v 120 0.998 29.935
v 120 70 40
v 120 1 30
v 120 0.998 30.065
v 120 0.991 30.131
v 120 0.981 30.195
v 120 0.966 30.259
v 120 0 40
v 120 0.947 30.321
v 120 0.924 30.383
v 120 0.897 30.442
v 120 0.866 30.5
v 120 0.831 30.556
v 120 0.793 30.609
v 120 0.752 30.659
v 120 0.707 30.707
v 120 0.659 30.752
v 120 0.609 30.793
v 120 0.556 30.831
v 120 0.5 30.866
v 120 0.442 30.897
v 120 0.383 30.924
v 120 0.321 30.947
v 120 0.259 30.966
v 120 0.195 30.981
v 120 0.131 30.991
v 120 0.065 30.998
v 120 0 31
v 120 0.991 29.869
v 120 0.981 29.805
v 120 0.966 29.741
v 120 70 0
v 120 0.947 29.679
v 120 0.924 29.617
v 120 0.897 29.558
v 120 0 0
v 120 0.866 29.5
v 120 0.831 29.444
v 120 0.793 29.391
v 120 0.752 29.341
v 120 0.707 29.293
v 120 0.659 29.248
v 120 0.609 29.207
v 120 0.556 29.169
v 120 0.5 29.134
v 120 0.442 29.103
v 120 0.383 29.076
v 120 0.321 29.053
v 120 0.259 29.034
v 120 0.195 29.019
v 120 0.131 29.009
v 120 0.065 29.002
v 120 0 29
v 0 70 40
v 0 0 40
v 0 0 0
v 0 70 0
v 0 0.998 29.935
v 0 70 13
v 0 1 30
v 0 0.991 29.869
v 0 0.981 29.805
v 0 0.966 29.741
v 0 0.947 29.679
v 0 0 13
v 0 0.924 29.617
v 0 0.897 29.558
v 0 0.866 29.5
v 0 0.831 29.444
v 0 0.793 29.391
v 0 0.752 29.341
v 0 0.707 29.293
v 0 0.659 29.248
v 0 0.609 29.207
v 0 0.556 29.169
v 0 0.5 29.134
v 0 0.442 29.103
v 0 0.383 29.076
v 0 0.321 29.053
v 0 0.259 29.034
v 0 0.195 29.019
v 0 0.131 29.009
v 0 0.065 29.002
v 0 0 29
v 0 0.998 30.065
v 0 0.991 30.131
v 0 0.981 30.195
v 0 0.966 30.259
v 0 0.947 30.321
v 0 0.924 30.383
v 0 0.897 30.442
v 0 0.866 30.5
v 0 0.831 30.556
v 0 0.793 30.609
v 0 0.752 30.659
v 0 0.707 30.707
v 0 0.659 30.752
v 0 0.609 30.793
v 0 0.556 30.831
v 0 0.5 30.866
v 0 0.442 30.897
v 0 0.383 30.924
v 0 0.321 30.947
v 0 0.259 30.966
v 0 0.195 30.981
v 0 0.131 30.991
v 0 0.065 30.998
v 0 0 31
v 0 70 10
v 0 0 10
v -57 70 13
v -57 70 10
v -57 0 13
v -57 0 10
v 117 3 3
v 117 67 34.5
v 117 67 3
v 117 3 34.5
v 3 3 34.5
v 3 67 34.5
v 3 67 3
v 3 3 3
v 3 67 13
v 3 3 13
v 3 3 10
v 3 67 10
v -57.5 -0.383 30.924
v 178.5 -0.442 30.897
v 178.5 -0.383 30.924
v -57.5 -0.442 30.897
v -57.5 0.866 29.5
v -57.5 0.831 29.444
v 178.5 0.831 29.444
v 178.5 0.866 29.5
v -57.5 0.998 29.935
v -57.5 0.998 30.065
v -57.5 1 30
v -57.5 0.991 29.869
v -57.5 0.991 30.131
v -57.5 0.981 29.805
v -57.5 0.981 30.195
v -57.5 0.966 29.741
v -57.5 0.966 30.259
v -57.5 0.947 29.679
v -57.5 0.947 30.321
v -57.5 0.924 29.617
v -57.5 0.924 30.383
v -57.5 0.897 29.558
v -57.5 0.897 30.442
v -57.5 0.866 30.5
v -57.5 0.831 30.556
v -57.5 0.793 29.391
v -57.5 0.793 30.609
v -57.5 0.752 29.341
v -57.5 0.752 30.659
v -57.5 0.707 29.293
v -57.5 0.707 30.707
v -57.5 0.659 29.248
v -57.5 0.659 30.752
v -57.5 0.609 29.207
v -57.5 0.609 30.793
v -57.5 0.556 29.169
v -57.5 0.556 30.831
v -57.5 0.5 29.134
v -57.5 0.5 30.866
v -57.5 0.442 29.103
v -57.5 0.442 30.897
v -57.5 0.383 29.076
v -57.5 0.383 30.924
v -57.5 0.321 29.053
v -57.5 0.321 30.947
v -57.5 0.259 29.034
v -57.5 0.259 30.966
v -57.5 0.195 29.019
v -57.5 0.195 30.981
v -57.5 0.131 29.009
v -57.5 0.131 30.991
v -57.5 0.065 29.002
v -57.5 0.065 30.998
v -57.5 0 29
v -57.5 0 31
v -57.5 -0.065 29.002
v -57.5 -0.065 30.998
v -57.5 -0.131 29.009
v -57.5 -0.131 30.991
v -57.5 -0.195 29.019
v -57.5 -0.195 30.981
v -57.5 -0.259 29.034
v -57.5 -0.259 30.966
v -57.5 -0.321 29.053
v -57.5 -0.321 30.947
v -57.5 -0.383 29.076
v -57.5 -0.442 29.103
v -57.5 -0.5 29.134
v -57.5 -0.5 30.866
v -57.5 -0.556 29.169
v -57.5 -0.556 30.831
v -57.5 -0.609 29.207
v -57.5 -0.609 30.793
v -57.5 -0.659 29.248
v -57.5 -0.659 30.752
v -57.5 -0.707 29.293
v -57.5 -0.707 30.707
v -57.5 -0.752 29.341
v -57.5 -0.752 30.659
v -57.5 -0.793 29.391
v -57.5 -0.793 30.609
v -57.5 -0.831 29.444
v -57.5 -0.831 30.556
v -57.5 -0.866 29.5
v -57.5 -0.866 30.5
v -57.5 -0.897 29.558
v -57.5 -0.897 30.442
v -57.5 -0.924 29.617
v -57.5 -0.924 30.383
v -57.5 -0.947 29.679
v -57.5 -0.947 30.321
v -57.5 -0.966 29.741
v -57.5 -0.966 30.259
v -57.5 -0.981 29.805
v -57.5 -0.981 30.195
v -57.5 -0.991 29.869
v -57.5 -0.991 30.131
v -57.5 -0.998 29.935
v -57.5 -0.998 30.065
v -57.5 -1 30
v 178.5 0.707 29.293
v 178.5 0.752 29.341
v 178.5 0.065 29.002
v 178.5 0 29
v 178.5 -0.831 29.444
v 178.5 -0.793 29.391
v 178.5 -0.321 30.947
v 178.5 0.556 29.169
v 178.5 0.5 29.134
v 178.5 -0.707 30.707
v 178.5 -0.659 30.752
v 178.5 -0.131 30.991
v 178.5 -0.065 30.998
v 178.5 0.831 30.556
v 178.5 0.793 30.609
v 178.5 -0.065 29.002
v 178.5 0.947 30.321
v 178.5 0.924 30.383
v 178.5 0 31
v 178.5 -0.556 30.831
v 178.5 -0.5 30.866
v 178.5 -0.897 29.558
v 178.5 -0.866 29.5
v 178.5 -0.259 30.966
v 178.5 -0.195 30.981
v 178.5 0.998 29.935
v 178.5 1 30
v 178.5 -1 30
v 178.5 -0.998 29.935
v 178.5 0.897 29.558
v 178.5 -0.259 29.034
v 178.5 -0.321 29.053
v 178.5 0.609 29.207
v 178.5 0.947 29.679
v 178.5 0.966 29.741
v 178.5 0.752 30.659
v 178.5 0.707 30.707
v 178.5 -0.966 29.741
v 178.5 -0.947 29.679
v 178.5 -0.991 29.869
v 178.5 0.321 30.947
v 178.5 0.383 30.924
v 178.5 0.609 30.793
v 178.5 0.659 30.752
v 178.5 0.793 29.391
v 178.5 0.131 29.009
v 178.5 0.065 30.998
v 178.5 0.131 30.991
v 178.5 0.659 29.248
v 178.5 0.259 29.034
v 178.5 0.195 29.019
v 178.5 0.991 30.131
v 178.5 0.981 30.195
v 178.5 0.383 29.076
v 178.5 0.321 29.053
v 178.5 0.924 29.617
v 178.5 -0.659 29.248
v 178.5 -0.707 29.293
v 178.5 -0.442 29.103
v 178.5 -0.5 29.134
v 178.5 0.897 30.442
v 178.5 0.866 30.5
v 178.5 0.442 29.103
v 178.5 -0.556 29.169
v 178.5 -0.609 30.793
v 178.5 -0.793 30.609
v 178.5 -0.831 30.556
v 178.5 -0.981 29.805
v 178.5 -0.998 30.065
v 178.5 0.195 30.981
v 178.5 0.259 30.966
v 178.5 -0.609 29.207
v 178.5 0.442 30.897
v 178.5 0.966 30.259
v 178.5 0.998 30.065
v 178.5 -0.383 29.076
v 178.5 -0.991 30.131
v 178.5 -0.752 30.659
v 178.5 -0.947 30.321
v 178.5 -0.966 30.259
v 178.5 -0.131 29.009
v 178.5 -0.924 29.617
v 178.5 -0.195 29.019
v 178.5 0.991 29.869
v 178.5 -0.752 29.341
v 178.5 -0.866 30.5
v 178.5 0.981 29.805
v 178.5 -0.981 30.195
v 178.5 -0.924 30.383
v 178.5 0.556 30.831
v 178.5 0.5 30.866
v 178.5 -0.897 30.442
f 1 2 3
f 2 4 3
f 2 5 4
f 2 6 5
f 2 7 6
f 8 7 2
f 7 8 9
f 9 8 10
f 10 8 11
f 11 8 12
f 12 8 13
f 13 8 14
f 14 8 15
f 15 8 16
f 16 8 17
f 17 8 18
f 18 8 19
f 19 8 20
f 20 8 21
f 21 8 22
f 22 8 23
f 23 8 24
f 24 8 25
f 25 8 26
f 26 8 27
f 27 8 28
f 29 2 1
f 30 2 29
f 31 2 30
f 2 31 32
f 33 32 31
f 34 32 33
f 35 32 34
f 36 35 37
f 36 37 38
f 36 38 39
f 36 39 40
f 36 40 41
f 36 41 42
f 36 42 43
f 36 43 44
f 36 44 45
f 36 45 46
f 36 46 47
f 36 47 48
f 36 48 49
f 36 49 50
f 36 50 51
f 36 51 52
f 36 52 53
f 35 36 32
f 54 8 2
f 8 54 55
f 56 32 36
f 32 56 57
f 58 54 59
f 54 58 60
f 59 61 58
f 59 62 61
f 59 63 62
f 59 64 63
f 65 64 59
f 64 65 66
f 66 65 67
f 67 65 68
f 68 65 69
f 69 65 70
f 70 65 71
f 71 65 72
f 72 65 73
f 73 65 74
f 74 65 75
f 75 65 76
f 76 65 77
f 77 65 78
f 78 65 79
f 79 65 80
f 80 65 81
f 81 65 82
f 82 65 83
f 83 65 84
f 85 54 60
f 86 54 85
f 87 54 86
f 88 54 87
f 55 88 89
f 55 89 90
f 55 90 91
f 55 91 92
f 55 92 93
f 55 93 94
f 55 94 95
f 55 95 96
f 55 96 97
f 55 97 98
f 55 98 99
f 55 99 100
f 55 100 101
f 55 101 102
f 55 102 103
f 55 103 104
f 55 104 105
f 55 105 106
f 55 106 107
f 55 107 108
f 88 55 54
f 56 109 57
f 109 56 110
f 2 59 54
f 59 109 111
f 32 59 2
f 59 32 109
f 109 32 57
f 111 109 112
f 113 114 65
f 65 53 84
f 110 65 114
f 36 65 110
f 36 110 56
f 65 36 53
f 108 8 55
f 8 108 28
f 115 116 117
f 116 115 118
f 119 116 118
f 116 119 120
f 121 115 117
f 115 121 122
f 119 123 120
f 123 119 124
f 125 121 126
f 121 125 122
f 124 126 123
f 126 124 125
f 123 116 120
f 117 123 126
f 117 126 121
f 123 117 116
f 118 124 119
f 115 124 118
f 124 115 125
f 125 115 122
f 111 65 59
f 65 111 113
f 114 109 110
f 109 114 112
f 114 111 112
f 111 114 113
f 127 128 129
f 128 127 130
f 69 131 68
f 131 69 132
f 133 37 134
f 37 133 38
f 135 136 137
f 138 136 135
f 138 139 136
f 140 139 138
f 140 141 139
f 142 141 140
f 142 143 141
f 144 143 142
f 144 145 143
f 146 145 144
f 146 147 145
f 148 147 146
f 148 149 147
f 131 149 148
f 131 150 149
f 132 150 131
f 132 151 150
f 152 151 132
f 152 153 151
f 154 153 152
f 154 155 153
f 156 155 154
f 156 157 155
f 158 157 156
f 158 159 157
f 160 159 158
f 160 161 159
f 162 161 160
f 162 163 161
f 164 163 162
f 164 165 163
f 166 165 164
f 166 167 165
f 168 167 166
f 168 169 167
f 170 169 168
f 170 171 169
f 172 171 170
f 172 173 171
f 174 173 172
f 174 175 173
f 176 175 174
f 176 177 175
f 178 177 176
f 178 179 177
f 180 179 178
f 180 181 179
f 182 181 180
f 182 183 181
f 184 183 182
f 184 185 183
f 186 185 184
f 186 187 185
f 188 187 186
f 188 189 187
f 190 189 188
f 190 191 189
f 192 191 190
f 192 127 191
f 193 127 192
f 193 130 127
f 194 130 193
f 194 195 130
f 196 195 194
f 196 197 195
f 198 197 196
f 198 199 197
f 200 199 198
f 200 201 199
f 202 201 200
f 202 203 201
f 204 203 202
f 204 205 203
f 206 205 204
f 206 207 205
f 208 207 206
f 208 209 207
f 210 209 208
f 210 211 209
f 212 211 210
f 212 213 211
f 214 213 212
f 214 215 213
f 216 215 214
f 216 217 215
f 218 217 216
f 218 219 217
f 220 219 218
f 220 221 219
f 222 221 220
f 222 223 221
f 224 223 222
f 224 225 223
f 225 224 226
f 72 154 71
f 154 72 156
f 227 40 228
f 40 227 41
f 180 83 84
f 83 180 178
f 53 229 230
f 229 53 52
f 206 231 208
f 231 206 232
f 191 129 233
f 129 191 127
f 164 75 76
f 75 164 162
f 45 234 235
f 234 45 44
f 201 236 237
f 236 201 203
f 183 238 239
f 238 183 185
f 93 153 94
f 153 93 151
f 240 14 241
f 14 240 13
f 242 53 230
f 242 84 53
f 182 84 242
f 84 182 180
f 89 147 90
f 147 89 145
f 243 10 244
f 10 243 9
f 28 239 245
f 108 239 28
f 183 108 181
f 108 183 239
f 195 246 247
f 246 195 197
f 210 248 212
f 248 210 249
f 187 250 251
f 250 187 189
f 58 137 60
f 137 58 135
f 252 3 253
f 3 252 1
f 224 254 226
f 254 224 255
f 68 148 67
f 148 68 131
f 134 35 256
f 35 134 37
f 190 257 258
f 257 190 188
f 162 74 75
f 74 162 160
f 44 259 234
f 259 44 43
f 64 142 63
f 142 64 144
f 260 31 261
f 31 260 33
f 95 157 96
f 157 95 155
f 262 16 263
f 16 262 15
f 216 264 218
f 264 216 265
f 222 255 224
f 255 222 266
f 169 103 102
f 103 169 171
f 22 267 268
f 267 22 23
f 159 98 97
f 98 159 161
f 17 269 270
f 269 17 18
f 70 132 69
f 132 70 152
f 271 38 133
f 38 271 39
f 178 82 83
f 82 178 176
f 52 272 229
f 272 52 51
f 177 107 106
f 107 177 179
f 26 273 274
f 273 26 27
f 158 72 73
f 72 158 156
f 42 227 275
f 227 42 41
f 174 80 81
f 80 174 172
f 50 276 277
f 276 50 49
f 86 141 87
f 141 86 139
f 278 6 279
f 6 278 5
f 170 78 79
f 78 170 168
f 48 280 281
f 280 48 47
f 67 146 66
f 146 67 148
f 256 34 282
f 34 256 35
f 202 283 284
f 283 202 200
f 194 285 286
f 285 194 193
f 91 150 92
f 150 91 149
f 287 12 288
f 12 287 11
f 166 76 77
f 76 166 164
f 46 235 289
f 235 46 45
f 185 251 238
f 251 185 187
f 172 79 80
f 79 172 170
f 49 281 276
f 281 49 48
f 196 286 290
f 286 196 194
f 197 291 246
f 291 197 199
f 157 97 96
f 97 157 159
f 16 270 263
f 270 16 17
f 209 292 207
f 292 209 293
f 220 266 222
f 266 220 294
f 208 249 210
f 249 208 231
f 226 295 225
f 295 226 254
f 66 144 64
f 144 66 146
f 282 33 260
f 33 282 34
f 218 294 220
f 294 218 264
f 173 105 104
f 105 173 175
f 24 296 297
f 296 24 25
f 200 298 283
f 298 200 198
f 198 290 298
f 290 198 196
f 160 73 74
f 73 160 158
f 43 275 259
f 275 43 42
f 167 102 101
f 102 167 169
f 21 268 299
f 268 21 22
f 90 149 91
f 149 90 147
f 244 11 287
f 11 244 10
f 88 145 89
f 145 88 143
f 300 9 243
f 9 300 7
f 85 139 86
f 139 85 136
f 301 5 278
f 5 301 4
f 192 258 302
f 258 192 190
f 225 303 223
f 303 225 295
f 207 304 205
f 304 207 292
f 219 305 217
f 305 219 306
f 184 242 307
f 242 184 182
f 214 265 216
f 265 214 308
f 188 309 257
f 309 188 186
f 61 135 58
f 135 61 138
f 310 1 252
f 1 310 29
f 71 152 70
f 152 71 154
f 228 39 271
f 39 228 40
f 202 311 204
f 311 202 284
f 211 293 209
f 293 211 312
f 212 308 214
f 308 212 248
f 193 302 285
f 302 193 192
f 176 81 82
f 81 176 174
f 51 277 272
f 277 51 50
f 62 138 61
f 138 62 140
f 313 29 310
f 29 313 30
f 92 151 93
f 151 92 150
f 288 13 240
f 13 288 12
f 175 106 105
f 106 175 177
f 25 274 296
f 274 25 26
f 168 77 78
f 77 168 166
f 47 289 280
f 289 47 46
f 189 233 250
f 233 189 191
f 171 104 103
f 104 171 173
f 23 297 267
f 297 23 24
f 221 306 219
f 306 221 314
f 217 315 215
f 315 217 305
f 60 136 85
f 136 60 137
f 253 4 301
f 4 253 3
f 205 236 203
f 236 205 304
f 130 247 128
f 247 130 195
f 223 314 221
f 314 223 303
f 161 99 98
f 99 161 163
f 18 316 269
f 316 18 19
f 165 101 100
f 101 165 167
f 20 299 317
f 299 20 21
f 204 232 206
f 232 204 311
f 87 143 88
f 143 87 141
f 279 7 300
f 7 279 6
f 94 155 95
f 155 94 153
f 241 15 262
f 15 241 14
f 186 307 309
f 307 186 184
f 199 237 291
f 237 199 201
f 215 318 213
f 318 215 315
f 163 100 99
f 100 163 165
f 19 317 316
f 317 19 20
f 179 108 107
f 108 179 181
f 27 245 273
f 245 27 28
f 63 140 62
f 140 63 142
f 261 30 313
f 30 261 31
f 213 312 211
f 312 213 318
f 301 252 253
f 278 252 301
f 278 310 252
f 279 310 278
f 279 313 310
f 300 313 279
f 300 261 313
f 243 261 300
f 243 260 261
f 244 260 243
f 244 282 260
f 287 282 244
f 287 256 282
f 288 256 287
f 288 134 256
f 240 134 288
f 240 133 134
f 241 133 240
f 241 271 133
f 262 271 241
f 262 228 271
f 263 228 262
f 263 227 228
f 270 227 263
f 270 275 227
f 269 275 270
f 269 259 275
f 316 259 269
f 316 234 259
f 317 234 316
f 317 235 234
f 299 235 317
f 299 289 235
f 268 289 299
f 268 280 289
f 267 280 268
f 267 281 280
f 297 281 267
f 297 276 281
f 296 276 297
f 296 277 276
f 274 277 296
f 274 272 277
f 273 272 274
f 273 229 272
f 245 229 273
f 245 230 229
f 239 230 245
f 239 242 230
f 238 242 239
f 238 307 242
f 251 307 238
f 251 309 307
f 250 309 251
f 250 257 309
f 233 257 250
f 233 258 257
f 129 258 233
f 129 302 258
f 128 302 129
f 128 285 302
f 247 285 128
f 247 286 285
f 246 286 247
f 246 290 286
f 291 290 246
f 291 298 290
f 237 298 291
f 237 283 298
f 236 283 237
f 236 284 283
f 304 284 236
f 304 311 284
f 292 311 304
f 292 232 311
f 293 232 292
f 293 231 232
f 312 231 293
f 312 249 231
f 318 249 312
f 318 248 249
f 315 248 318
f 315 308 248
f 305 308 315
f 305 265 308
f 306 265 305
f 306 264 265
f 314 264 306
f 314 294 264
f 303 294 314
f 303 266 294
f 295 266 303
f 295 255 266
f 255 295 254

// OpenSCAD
// Mini horizontal gel-electrophoresis box - buffer tank
// Print orientation: tank resting on XY plane, open top facing up (+Z)

// ---------------- Parameters ----------------
outer_x      = 120;   // outer length in X (mm)
outer_y      = 70;    // outer width in Y (mm)
outer_z      = 40;    // outer height in Z (mm)

wall         = 3;     // wall thickness (mm)

floor        = 3;     // floor thickness under the tank (mm)

platform_x   = 60;    // platform length along X (mm), centred
platform_y   = outer_y; // platform spans full inner width (mm)

platform_top_z = 13;  // height of platform top above outer floor (mm)

hole_d       = 2;     // electrode hole diameter (mm)

hole_y       = 0;     // electrode hole Y position (mm)

hole_z       = 30;    // electrode hole Z position (mm)

eps          = 0.5;   // cutter overshoot past faces (mm)

$fn = 96;             // curve resolution

// ---------------- Derived ----------------
inner_x = outer_x - 2 * wall;   // 114 mm
inner_y = outer_y - 2 * wall;   // 64 mm
inner_z = outer_z - floor - 2 * wall; // 34 mm (space between floor and open top)

platform_bot_z = platform_top_z - wall; // 10 mm (matches user statement: top at z = 13, wall 3)

// ---------------- Model ----------------
union() {
    // Tank body: floor + side walls, open top
    difference() {
        cube([outer_x, outer_y, outer_z]);

        // Cut out the open-top inner volume (through the top face)
        translate([wall, wall, floor])
            cube([inner_x, inner_y, inner_z + eps]);
    }

    // Gel-tray platform, centred in X, spanning full inner width
    translate([-inner_x / 2, 0, platform_bot_z])
        cube([platform_x, platform_y, wall]);
}

// ---------------- Electrode holes ----------------
// Horizontal 2 mm holes along X, through each end wall, at y = 0, z = 30
for (sx = [-1, 1]) {
    translate([sx > 0 ? inner_x / 2 + eps : -inner_x / 2 - eps,
               hole_y,
               hole_z])
        rotate([0, 90, 0])
            cylinder(d = hole_d, h = outer_x + 2 * eps);
}
